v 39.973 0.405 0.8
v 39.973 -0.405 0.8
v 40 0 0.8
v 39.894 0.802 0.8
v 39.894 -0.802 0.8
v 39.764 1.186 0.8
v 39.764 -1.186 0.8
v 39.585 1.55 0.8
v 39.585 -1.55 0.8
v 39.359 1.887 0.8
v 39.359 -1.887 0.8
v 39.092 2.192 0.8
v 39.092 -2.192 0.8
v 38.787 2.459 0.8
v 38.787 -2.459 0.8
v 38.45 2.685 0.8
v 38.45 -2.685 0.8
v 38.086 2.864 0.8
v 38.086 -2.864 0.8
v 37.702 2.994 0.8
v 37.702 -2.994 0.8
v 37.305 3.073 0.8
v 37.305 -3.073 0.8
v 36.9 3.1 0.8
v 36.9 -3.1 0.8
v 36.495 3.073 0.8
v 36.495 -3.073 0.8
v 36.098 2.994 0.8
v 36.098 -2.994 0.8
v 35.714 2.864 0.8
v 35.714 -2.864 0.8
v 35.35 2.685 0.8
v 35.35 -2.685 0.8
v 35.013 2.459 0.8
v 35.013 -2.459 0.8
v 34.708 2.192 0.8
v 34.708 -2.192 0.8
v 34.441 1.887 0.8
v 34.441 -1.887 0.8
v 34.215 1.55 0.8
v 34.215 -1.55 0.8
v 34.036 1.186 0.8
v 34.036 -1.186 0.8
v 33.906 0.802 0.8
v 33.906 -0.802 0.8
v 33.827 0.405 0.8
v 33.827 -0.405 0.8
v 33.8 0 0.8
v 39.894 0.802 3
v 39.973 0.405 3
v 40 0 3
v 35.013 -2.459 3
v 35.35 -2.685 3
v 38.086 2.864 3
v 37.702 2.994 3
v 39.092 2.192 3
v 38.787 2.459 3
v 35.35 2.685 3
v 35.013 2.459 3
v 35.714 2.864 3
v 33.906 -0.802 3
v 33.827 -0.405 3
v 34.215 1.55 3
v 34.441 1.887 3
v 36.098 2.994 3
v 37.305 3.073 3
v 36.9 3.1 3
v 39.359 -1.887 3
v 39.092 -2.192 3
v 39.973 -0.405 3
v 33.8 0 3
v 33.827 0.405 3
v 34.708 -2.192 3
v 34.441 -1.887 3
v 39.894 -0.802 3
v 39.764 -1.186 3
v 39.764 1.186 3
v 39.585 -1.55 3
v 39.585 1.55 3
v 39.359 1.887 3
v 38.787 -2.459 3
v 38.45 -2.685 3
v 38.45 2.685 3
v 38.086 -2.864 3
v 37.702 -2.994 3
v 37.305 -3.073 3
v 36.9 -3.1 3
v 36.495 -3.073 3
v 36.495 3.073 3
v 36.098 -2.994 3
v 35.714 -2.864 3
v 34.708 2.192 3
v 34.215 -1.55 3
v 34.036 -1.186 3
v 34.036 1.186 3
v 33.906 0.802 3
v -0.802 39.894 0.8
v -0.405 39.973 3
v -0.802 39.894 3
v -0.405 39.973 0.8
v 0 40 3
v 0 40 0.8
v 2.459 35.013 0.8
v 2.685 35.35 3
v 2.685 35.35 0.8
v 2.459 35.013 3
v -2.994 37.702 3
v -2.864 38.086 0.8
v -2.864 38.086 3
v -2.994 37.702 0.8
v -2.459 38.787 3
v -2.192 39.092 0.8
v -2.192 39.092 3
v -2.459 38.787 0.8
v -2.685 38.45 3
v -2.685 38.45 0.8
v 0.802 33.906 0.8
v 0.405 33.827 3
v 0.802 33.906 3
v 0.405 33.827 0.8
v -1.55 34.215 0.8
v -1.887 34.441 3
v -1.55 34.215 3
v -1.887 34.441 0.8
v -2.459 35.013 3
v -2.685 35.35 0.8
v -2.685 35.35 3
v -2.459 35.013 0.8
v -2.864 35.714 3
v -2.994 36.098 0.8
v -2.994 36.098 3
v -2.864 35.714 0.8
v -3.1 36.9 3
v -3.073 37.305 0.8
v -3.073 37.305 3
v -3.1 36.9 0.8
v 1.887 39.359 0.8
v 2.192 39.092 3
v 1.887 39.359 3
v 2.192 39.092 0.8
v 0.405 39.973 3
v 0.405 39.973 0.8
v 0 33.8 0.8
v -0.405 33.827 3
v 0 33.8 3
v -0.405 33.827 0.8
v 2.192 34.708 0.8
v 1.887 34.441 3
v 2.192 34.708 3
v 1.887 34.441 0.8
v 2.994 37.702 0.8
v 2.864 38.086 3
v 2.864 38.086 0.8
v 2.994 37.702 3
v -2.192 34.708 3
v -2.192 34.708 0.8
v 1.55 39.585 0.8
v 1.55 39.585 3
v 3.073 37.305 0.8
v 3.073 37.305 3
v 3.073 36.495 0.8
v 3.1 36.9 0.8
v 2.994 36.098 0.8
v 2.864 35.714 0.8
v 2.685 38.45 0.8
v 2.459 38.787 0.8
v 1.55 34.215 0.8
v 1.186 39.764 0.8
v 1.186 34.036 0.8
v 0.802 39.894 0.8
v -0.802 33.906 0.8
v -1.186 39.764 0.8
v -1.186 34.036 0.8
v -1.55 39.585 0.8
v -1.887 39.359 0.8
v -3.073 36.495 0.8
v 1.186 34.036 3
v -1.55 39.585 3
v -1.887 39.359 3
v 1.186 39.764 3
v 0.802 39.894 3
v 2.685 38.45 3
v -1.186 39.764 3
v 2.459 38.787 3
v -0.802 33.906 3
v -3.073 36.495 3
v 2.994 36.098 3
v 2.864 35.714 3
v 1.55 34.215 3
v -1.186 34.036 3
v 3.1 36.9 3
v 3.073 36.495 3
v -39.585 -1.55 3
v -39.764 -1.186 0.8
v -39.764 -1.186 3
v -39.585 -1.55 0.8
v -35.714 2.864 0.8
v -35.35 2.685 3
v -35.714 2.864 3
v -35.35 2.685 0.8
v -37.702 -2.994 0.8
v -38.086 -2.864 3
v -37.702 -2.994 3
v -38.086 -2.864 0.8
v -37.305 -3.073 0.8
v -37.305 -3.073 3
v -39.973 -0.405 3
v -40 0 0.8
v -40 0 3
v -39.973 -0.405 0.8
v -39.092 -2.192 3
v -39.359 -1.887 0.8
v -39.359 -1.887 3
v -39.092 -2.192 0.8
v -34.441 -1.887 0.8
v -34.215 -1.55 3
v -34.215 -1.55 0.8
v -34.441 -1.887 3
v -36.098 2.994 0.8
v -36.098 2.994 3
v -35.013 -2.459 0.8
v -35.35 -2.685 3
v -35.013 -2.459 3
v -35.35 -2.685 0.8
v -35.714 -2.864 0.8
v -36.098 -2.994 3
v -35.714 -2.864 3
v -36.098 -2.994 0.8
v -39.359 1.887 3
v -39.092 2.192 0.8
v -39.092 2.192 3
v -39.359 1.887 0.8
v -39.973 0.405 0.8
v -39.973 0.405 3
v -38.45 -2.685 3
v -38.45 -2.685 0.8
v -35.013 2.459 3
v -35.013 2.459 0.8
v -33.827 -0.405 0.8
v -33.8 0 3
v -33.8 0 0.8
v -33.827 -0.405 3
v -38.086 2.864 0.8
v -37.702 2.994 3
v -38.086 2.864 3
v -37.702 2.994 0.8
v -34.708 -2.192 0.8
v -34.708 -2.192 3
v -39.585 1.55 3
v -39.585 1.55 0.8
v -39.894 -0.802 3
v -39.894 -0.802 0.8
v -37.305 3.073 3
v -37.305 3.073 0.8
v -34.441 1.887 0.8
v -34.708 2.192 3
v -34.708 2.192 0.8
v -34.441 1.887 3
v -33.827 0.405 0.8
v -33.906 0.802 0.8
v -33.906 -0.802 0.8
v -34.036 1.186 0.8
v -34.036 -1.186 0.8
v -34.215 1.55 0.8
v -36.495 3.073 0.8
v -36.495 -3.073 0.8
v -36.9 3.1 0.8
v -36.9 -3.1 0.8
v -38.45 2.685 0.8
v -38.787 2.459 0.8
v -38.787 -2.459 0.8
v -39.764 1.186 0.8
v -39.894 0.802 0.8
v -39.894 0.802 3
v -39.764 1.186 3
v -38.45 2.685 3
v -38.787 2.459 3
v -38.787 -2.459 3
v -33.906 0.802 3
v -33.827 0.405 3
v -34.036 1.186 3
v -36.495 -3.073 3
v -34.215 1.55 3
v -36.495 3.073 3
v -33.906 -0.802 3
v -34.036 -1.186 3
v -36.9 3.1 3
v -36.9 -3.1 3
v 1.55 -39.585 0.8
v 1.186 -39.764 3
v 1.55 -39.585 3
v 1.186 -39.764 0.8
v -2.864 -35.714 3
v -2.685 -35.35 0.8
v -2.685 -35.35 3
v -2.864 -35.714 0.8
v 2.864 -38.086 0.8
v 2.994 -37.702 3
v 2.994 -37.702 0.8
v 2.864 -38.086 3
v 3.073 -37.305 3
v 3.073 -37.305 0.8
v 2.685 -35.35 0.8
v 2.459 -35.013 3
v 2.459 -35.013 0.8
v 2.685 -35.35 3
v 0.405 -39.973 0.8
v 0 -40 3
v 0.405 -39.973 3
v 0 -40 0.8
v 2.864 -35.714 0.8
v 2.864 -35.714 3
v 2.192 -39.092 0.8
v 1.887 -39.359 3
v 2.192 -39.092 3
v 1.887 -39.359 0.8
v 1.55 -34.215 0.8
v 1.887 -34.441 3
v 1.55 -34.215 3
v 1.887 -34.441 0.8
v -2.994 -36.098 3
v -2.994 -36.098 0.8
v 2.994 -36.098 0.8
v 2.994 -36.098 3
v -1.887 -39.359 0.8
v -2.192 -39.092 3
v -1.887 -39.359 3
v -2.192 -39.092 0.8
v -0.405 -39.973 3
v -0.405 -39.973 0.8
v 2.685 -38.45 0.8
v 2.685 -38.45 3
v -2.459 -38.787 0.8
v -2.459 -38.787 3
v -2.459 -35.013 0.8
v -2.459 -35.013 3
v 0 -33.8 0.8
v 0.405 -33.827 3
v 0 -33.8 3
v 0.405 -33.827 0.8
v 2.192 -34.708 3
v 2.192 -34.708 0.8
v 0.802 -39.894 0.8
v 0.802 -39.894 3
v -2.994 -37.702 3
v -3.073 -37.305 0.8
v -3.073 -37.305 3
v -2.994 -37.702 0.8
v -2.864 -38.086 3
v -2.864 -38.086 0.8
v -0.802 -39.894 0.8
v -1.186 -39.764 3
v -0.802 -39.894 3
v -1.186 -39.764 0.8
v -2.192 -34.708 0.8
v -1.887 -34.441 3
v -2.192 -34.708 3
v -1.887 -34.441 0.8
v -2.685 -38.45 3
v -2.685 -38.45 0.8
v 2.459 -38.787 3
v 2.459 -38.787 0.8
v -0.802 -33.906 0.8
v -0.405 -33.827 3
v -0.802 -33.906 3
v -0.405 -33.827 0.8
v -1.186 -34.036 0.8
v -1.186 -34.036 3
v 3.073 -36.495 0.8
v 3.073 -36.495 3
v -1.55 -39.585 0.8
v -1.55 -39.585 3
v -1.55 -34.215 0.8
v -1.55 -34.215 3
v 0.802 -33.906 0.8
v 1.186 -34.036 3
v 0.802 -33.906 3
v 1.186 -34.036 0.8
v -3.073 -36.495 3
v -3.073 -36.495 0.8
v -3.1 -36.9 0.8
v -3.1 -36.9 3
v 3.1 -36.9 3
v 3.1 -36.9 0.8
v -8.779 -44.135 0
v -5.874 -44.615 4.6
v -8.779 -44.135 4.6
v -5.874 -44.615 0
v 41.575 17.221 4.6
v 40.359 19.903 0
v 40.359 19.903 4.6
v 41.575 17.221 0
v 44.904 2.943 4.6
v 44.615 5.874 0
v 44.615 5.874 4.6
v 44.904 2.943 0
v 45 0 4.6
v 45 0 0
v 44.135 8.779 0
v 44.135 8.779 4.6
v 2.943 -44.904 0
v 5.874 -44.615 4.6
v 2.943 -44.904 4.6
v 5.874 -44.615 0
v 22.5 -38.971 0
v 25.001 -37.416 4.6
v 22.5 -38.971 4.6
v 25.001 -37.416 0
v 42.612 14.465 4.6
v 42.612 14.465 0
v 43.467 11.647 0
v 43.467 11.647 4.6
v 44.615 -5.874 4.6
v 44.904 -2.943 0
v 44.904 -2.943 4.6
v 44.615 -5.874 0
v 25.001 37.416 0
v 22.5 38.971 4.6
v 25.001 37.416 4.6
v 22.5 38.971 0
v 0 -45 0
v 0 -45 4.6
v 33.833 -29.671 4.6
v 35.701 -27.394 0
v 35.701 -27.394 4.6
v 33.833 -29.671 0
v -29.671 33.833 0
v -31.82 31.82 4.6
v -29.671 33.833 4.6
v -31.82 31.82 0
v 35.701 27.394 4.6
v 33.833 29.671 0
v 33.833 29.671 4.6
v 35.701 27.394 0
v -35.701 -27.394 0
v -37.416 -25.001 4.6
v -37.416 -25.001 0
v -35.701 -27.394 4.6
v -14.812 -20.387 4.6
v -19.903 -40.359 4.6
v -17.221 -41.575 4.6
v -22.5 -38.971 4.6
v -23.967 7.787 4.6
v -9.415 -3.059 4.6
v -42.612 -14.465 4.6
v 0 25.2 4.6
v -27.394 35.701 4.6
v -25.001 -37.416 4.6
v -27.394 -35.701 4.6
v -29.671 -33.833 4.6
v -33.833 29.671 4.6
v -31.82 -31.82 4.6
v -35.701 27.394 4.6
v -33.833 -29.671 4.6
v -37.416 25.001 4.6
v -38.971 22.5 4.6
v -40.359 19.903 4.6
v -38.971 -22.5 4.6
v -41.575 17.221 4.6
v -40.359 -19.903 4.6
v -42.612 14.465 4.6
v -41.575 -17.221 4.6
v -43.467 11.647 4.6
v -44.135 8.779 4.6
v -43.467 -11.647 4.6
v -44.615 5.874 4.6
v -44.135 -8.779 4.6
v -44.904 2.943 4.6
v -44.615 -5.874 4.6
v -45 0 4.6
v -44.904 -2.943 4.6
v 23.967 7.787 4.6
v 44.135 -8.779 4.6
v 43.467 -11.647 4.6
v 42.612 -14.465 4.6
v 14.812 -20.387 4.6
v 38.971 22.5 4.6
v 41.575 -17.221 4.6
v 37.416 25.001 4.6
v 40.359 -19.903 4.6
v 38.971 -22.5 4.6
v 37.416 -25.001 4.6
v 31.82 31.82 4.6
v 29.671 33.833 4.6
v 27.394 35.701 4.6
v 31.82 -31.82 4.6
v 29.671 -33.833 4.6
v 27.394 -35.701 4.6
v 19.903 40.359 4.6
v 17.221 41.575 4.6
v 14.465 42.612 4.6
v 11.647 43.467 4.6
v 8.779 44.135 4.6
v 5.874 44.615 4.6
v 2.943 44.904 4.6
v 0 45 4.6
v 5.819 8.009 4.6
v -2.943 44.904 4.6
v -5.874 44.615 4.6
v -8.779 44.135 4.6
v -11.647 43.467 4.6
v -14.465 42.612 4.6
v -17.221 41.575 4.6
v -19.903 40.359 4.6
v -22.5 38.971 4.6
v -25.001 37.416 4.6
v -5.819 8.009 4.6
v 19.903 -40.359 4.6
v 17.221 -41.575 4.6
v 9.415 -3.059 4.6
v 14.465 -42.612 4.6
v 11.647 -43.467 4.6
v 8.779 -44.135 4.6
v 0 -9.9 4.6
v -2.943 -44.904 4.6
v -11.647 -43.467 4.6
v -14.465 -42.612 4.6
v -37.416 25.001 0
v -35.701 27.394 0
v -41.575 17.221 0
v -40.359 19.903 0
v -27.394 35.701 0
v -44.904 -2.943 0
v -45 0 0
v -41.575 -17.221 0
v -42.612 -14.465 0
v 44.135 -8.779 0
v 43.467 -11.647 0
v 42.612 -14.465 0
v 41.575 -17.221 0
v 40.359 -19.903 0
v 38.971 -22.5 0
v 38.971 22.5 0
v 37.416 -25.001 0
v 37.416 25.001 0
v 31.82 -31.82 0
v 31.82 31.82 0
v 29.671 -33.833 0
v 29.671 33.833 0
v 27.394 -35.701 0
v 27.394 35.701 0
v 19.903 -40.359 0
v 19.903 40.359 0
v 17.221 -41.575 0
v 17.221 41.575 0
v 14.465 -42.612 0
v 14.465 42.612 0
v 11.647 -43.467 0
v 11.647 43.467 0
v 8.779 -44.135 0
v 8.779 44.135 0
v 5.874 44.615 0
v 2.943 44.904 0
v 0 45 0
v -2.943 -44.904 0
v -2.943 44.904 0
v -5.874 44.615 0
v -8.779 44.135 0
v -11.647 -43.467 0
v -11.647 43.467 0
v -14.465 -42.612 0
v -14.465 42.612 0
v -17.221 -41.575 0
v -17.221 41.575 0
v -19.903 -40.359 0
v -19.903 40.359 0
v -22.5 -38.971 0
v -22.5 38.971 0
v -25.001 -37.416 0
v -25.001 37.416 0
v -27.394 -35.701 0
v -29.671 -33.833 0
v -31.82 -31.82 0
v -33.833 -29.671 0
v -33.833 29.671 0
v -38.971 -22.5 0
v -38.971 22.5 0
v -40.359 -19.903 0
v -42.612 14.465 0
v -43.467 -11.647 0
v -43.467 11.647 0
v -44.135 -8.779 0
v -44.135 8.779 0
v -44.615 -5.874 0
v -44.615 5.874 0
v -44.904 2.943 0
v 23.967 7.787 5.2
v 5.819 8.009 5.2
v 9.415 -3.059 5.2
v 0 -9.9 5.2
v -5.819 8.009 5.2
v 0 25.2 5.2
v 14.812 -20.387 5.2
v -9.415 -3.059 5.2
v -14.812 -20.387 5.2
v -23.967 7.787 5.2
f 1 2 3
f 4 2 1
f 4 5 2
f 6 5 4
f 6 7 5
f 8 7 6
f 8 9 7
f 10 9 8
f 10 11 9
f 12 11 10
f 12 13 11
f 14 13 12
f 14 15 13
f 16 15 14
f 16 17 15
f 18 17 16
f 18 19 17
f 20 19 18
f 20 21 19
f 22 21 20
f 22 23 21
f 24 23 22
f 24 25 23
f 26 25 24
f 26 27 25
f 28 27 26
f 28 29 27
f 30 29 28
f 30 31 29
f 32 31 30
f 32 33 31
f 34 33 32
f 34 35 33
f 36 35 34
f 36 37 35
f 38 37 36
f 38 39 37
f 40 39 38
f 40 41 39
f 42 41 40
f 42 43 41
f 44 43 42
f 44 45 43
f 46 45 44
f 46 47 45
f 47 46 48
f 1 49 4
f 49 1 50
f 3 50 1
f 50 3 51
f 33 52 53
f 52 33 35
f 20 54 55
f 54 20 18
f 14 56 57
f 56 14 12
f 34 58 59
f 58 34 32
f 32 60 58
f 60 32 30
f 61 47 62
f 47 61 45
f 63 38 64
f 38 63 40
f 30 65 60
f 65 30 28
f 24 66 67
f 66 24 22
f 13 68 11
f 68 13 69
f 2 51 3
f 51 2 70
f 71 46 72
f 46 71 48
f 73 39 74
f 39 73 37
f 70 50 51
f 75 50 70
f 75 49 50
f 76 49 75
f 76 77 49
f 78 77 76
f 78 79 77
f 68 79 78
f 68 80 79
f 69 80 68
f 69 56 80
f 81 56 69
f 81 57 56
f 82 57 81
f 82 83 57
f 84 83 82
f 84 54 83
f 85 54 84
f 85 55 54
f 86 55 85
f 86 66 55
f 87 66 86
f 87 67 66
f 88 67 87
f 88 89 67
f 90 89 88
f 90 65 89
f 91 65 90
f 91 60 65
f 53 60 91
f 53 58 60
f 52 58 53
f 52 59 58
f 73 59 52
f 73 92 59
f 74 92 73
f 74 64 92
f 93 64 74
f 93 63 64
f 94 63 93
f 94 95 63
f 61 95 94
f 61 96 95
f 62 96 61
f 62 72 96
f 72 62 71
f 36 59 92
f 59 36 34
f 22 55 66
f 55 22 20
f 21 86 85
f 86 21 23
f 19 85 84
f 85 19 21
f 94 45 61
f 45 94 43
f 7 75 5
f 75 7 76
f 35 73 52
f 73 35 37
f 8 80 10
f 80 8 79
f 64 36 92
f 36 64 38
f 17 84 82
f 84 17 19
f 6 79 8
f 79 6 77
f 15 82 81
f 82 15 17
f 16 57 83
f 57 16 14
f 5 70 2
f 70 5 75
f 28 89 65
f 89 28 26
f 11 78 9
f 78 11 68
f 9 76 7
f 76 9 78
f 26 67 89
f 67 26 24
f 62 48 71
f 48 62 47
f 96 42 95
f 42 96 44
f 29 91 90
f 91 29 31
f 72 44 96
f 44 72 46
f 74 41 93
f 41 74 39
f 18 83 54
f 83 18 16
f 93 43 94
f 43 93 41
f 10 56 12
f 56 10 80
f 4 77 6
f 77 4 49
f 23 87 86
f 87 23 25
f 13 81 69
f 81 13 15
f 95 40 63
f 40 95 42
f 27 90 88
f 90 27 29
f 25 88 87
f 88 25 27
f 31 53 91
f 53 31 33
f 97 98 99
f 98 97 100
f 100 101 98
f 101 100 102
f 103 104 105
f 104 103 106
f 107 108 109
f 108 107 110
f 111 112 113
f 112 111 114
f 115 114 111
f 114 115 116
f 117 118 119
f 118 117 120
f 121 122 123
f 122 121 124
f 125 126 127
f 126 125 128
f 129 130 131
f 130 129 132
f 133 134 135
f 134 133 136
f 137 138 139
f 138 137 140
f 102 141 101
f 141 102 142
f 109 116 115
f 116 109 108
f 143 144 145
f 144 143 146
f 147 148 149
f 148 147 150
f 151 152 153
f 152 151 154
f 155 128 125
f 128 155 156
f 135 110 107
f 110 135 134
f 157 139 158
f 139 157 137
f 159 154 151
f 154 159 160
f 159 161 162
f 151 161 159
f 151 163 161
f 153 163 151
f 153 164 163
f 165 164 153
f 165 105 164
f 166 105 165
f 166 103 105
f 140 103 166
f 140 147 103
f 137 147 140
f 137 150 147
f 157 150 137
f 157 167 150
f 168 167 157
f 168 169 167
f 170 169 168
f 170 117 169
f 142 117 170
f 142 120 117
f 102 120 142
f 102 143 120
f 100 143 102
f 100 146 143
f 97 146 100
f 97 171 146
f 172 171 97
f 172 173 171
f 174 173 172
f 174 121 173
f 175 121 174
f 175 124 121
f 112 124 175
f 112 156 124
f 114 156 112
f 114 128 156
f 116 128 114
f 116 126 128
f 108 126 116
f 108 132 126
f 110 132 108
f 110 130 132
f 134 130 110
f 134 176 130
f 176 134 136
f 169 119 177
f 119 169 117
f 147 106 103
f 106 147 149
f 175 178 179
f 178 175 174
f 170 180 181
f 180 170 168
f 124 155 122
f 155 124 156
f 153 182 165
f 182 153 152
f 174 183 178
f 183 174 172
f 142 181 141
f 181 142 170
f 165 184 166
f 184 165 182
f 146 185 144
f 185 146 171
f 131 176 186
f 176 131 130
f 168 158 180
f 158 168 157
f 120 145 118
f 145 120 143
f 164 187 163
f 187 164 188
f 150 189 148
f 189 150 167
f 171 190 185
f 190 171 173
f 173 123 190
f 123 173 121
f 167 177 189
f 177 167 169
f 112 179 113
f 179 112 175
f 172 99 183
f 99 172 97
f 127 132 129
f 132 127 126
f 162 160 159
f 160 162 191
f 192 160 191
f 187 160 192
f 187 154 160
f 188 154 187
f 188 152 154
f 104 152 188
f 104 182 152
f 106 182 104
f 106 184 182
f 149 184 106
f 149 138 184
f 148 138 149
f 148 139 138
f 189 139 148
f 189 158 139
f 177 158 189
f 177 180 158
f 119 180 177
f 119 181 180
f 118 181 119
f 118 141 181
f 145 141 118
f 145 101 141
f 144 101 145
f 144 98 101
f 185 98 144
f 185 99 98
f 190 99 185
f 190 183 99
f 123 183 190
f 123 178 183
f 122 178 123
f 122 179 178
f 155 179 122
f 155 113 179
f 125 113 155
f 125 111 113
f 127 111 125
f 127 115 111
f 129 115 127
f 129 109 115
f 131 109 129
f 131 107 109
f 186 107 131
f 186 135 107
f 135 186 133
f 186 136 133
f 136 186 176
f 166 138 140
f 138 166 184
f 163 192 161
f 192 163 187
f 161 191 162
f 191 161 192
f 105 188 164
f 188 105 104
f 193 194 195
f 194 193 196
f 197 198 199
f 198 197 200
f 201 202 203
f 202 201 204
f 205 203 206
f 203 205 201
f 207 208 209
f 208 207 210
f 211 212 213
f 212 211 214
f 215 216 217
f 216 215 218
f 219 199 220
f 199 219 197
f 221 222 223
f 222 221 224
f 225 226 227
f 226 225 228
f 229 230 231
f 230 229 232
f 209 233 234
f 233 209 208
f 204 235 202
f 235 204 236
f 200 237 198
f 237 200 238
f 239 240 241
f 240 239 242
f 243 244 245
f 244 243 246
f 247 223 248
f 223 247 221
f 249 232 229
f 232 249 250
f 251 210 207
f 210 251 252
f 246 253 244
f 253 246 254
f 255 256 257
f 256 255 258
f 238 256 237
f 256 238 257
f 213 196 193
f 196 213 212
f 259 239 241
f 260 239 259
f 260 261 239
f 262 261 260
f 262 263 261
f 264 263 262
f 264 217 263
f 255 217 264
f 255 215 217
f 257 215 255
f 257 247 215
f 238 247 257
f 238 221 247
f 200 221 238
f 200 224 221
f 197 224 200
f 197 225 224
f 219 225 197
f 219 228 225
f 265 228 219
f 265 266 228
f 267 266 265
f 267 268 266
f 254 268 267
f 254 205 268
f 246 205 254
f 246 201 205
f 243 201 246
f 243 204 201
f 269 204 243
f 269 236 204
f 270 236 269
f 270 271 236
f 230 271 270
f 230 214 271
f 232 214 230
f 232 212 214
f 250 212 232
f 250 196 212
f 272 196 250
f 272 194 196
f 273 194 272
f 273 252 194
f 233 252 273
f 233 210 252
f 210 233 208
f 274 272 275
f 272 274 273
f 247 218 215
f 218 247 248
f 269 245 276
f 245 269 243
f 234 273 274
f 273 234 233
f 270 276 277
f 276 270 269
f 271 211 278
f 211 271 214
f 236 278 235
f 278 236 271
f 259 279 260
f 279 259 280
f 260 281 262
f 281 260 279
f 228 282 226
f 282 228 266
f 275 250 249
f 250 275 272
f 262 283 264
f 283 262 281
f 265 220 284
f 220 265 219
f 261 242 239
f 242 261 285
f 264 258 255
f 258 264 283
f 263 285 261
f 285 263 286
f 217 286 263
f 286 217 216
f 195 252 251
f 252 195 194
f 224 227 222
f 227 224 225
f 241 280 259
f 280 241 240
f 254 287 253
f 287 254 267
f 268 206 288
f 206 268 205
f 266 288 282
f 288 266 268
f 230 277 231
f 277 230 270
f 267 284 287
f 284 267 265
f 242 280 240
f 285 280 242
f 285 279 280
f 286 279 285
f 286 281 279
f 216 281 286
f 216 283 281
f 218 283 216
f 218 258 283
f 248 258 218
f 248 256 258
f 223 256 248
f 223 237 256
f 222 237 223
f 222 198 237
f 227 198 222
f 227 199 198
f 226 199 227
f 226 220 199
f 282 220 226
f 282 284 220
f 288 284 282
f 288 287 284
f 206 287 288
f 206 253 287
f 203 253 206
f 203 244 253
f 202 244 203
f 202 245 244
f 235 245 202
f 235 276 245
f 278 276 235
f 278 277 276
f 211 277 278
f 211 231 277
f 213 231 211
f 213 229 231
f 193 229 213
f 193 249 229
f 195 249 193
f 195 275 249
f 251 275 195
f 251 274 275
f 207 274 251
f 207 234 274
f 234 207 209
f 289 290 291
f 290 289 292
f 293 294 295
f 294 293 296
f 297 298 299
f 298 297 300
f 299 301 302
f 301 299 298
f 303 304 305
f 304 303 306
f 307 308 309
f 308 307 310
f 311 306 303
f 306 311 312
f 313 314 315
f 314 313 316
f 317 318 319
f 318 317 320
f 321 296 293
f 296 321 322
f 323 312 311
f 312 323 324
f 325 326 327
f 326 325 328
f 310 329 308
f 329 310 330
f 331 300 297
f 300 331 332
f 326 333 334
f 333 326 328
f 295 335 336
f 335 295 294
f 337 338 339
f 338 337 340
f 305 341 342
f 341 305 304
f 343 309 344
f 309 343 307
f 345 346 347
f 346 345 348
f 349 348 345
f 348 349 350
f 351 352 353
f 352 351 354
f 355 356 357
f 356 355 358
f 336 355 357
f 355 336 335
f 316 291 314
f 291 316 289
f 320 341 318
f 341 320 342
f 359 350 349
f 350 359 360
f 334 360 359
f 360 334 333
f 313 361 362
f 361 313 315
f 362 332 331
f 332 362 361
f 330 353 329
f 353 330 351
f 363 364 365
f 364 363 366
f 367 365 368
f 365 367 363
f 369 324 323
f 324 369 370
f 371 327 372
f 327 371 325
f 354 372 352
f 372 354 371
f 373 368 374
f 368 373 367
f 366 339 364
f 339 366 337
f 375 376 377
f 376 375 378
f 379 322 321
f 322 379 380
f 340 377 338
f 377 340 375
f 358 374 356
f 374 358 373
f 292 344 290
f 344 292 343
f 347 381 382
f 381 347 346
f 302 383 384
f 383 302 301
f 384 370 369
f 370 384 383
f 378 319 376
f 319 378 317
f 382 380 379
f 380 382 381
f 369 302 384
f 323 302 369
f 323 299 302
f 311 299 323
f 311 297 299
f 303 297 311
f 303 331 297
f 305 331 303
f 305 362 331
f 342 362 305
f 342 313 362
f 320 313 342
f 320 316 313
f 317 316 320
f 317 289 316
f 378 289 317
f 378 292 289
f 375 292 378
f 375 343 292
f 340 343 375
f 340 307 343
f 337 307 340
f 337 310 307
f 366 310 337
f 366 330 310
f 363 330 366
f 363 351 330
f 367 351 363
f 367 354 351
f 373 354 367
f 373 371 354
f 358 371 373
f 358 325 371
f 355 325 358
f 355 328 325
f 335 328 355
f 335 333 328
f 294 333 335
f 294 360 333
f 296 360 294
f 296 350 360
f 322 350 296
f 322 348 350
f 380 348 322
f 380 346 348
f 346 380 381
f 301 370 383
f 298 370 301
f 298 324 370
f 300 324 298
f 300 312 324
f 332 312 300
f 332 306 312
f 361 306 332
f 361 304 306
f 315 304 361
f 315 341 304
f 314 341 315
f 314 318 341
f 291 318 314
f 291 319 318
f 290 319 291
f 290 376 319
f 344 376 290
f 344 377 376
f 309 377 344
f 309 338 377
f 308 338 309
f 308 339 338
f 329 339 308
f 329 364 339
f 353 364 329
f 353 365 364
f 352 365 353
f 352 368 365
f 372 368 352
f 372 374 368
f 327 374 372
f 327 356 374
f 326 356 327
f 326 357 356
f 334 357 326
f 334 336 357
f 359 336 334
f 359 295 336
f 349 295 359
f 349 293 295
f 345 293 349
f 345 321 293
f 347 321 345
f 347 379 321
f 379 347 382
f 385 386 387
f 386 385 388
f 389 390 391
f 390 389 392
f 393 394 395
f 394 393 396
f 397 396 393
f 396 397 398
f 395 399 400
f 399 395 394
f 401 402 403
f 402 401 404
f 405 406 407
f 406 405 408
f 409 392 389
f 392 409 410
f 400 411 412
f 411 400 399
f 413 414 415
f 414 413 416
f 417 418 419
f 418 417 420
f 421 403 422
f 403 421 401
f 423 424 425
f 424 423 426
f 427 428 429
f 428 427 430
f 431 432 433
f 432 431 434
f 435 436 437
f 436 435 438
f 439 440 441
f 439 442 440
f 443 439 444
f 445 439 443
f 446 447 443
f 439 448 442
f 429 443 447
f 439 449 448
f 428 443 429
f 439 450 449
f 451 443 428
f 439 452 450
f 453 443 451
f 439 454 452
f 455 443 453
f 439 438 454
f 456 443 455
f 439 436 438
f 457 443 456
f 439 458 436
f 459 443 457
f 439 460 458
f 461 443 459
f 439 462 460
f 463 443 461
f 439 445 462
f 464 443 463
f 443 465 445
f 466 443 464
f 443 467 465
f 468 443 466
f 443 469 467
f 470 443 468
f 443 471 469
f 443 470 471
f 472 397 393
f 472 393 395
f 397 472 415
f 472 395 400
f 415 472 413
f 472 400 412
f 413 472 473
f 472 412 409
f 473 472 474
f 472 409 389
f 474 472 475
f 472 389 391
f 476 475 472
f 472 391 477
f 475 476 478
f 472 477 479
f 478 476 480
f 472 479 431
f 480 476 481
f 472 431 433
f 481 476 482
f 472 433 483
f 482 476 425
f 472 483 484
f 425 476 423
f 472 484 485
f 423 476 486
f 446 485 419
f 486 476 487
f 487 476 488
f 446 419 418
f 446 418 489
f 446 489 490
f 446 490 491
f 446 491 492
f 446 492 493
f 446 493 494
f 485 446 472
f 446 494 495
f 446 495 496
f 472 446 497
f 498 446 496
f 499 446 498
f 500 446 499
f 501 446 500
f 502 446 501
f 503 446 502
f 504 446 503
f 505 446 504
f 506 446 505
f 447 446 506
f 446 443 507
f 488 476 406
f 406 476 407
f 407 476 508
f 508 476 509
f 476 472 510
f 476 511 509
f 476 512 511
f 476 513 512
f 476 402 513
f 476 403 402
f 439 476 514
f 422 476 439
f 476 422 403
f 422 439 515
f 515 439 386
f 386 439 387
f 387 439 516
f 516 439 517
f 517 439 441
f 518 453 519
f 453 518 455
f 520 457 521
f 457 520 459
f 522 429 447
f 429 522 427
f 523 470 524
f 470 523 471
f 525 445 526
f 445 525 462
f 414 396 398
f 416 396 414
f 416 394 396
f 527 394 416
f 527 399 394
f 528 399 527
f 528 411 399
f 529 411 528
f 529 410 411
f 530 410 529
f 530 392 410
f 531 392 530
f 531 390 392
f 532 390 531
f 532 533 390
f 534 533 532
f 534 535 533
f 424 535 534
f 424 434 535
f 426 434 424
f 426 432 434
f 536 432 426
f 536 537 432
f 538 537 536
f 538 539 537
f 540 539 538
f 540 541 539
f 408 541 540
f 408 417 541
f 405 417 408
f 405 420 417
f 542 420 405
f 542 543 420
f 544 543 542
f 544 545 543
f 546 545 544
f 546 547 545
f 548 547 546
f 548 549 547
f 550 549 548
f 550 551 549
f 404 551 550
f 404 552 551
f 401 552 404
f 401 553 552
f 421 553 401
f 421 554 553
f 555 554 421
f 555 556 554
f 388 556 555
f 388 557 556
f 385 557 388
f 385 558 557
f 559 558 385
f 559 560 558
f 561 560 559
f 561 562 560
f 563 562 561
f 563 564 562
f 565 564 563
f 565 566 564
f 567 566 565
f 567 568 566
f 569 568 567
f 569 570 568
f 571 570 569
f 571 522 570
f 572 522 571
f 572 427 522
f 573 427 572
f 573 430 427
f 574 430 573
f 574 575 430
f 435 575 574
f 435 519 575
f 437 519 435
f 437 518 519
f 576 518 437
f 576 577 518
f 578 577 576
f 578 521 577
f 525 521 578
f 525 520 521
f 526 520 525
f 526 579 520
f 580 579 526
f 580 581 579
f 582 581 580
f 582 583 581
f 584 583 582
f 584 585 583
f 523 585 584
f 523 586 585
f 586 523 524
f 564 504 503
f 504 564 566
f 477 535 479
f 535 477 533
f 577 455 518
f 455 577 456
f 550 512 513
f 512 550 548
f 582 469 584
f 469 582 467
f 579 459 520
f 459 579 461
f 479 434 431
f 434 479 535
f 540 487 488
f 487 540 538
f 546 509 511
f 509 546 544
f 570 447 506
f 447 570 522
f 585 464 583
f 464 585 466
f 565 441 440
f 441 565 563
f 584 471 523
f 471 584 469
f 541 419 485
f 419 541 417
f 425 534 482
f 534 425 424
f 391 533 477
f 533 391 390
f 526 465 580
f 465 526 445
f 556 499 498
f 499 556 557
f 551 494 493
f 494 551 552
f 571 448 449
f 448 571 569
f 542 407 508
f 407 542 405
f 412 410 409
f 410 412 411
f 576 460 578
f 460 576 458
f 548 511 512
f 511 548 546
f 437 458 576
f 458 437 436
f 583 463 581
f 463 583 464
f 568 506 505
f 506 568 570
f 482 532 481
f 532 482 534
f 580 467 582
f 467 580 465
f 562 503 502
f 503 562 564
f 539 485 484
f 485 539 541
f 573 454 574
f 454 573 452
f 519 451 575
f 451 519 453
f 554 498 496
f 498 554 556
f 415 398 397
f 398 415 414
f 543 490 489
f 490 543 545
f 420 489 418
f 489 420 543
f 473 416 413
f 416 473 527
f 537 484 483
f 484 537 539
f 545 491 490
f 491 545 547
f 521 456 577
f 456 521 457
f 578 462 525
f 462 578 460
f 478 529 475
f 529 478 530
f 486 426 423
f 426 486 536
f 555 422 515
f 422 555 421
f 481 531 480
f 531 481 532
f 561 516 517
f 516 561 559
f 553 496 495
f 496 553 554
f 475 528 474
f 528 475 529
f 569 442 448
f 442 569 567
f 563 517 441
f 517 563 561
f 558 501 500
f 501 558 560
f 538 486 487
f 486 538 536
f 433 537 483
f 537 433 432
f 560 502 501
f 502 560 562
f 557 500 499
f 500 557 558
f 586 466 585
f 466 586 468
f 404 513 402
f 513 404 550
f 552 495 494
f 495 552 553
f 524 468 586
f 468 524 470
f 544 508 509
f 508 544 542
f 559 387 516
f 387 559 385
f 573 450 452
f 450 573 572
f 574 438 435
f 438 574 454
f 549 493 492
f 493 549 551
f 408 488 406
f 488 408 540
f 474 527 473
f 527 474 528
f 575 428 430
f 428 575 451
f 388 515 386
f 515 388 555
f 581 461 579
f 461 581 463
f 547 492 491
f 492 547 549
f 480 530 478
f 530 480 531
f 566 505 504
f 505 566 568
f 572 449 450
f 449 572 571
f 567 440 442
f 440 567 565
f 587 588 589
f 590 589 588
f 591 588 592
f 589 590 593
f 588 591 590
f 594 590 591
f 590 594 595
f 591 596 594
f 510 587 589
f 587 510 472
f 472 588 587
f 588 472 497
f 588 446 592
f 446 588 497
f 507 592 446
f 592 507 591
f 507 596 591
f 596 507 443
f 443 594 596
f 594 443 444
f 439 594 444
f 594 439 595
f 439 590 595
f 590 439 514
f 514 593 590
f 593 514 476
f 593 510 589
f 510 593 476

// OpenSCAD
// ============================================================
// MAGNET COASTER — hidden magnets, sealed INSIDE the print
// ============================================================
// A coaster (or fridge badge) with round magnets buried inside
// it. Nobody can see them, nothing rattles: you PAUSE the print
// partway, drop the magnets into their pockets, and the printer
// seals them in when it resumes. The pockets have solid plastic
// 0.8 mm below AND above the magnets.
//
// >>> GET DAD — this is a two-person print: <<<
//   - The printer is HOT and mid-print when you open it. Dad
//     places the magnets, kids direct.
//   - POLARITY CHECK before resuming: stack all the magnets on
//     one spare magnet on the table first, then place them
//     without flipping — same pole up in every pocket, or your
//     coaster will push away from the fridge instead of sticking.
//   - Small strong magnets are DANGEROUS if swallowed — keep
//     them away from little kids and count them before/after.
//
// Watch the ECHO output when you render: it prints the exact
// height to type into Bambu Studio's "pause at height".
//
// Print: flat on the plate, no supports. The 0.8 mm roof over
// each magnet bridges just fine at this size. ~40 min in PLA.
// ============================================================

// ------------ CHANGE THESE ------------
magnet_d     = 6.2;    // pocket diameter: 6 mm magnet + 0.2 wiggle room
magnet_h     = 2.2;    // pocket depth: 2 mm magnet + 0.2 so the roof
                       //   never squishes down onto the magnet
n_magnets    = 4;      // how many magnets around the ring
coaster_d    = 90;     // coaster diameter (mm)
coaster_h    = 4.6;    // total thickness (mm)
layer_h      = 0.2;    // your layer height in Bambu Studio
emboss_style = "star"; // "star", "ball", or "none" — raised art to paint
// ---------------------------------------

cover  = 0.8;                        // solid plastic below AND above magnets
ring_r = coaster_d/2 - magnet_d/2 - 5;  // pocket circle, near the edge

// ---- safety checks: OpenSCAD refuses to render a bad design ----
assert(coaster_h >= cover + magnet_h + cover,
       "coaster_h too thin! Needs 0.8 + magnet_h + 0.8 minimum.");
assert(2 * ring_r * sin(180 / n_magnets) >= magnet_d + 2,
       "Too many magnets for this diameter - fewer magnets or bigger coaster.");

// ============ PAUSE-AT-HEIGHT NOTE (read the console!) ============
// The pockets run from z = 0.8 up to z = 0.8 + magnet_h. The
// printer must pause when the pockets are OPEN but about to be
// roofed over — exactly at the pocket-top height. If that isn't
// a whole number of layers, we round UP to the next layer (a
// hair of extra headroom never hurts; too little jams the nozzle).
pause_z_exact = cover + magnet_h;
pause_z       = ceil(pause_z_exact / layer_h) * layer_h;
echo(str(">>> BAMBU STUDIO: set 'pause at height' to Z = ", pause_z,
         " mm  (that is layer ", pause_z / layer_h,
         " at ", layer_h, " mm layers) <<<"));

$fn = 96;

// ============ the coaster body, minus the magnet pockets ============
difference() {
    cylinder(h = coaster_h, d = coaster_d);
    for (i = [0 : n_magnets - 1])
        rotate([0, 0, i * 360 / n_magnets])
            translate([ring_r, 0, cover])           // 0.8 mm floor below...
                cylinder(h = magnet_h, d = magnet_d, $fn = 48);
                // ...and the roof above is coaster_h - 0.8 - magnet_h,
                // which the assert up top guarantees is >= 0.8
}

// ============ raised art on top (0.6 mm — easy to paint) ============
module star(points, r_out, r_in) {  // a classic star outline
    polygon([ for (i = [0 : 2 * points - 1])
        let (r = (i % 2 == 0) ? r_out : r_in,
             a = 90 + i * 180 / points)
        [r * cos(a), r * sin(a)] ]);
}

translate([0, 0, coaster_h]) {
    if (emboss_style == "star")
        linear_extrude(0.6)
            star(5, coaster_d * 0.28, coaster_d * 0.11);
    if (emboss_style == "ball") {    // a simple soccer ball for Matt
        linear_extrude(0.6)
            difference() {           // the ball outline
                circle(d = coaster_d * 0.55);
                circle(d = coaster_d * 0.55 - 5);
            }
        linear_extrude(0.6)          // the middle pentagon patch
            rotate([0, 0, 90])
                circle(d = coaster_d * 0.2, $fn = 5);
    }
}

// IDEAS TO TRY (or ask Claude):
//  - a fridge NAME badge: swap the star for text(), one per family member
//  - Peter: a coaster set where each one is a different city's street grid
//  - Matt: Mario-INSPIRED (your own design!) power-up badge, ? block style
//  - magnetic chess/checkers pieces — tiny version with one magnet each
